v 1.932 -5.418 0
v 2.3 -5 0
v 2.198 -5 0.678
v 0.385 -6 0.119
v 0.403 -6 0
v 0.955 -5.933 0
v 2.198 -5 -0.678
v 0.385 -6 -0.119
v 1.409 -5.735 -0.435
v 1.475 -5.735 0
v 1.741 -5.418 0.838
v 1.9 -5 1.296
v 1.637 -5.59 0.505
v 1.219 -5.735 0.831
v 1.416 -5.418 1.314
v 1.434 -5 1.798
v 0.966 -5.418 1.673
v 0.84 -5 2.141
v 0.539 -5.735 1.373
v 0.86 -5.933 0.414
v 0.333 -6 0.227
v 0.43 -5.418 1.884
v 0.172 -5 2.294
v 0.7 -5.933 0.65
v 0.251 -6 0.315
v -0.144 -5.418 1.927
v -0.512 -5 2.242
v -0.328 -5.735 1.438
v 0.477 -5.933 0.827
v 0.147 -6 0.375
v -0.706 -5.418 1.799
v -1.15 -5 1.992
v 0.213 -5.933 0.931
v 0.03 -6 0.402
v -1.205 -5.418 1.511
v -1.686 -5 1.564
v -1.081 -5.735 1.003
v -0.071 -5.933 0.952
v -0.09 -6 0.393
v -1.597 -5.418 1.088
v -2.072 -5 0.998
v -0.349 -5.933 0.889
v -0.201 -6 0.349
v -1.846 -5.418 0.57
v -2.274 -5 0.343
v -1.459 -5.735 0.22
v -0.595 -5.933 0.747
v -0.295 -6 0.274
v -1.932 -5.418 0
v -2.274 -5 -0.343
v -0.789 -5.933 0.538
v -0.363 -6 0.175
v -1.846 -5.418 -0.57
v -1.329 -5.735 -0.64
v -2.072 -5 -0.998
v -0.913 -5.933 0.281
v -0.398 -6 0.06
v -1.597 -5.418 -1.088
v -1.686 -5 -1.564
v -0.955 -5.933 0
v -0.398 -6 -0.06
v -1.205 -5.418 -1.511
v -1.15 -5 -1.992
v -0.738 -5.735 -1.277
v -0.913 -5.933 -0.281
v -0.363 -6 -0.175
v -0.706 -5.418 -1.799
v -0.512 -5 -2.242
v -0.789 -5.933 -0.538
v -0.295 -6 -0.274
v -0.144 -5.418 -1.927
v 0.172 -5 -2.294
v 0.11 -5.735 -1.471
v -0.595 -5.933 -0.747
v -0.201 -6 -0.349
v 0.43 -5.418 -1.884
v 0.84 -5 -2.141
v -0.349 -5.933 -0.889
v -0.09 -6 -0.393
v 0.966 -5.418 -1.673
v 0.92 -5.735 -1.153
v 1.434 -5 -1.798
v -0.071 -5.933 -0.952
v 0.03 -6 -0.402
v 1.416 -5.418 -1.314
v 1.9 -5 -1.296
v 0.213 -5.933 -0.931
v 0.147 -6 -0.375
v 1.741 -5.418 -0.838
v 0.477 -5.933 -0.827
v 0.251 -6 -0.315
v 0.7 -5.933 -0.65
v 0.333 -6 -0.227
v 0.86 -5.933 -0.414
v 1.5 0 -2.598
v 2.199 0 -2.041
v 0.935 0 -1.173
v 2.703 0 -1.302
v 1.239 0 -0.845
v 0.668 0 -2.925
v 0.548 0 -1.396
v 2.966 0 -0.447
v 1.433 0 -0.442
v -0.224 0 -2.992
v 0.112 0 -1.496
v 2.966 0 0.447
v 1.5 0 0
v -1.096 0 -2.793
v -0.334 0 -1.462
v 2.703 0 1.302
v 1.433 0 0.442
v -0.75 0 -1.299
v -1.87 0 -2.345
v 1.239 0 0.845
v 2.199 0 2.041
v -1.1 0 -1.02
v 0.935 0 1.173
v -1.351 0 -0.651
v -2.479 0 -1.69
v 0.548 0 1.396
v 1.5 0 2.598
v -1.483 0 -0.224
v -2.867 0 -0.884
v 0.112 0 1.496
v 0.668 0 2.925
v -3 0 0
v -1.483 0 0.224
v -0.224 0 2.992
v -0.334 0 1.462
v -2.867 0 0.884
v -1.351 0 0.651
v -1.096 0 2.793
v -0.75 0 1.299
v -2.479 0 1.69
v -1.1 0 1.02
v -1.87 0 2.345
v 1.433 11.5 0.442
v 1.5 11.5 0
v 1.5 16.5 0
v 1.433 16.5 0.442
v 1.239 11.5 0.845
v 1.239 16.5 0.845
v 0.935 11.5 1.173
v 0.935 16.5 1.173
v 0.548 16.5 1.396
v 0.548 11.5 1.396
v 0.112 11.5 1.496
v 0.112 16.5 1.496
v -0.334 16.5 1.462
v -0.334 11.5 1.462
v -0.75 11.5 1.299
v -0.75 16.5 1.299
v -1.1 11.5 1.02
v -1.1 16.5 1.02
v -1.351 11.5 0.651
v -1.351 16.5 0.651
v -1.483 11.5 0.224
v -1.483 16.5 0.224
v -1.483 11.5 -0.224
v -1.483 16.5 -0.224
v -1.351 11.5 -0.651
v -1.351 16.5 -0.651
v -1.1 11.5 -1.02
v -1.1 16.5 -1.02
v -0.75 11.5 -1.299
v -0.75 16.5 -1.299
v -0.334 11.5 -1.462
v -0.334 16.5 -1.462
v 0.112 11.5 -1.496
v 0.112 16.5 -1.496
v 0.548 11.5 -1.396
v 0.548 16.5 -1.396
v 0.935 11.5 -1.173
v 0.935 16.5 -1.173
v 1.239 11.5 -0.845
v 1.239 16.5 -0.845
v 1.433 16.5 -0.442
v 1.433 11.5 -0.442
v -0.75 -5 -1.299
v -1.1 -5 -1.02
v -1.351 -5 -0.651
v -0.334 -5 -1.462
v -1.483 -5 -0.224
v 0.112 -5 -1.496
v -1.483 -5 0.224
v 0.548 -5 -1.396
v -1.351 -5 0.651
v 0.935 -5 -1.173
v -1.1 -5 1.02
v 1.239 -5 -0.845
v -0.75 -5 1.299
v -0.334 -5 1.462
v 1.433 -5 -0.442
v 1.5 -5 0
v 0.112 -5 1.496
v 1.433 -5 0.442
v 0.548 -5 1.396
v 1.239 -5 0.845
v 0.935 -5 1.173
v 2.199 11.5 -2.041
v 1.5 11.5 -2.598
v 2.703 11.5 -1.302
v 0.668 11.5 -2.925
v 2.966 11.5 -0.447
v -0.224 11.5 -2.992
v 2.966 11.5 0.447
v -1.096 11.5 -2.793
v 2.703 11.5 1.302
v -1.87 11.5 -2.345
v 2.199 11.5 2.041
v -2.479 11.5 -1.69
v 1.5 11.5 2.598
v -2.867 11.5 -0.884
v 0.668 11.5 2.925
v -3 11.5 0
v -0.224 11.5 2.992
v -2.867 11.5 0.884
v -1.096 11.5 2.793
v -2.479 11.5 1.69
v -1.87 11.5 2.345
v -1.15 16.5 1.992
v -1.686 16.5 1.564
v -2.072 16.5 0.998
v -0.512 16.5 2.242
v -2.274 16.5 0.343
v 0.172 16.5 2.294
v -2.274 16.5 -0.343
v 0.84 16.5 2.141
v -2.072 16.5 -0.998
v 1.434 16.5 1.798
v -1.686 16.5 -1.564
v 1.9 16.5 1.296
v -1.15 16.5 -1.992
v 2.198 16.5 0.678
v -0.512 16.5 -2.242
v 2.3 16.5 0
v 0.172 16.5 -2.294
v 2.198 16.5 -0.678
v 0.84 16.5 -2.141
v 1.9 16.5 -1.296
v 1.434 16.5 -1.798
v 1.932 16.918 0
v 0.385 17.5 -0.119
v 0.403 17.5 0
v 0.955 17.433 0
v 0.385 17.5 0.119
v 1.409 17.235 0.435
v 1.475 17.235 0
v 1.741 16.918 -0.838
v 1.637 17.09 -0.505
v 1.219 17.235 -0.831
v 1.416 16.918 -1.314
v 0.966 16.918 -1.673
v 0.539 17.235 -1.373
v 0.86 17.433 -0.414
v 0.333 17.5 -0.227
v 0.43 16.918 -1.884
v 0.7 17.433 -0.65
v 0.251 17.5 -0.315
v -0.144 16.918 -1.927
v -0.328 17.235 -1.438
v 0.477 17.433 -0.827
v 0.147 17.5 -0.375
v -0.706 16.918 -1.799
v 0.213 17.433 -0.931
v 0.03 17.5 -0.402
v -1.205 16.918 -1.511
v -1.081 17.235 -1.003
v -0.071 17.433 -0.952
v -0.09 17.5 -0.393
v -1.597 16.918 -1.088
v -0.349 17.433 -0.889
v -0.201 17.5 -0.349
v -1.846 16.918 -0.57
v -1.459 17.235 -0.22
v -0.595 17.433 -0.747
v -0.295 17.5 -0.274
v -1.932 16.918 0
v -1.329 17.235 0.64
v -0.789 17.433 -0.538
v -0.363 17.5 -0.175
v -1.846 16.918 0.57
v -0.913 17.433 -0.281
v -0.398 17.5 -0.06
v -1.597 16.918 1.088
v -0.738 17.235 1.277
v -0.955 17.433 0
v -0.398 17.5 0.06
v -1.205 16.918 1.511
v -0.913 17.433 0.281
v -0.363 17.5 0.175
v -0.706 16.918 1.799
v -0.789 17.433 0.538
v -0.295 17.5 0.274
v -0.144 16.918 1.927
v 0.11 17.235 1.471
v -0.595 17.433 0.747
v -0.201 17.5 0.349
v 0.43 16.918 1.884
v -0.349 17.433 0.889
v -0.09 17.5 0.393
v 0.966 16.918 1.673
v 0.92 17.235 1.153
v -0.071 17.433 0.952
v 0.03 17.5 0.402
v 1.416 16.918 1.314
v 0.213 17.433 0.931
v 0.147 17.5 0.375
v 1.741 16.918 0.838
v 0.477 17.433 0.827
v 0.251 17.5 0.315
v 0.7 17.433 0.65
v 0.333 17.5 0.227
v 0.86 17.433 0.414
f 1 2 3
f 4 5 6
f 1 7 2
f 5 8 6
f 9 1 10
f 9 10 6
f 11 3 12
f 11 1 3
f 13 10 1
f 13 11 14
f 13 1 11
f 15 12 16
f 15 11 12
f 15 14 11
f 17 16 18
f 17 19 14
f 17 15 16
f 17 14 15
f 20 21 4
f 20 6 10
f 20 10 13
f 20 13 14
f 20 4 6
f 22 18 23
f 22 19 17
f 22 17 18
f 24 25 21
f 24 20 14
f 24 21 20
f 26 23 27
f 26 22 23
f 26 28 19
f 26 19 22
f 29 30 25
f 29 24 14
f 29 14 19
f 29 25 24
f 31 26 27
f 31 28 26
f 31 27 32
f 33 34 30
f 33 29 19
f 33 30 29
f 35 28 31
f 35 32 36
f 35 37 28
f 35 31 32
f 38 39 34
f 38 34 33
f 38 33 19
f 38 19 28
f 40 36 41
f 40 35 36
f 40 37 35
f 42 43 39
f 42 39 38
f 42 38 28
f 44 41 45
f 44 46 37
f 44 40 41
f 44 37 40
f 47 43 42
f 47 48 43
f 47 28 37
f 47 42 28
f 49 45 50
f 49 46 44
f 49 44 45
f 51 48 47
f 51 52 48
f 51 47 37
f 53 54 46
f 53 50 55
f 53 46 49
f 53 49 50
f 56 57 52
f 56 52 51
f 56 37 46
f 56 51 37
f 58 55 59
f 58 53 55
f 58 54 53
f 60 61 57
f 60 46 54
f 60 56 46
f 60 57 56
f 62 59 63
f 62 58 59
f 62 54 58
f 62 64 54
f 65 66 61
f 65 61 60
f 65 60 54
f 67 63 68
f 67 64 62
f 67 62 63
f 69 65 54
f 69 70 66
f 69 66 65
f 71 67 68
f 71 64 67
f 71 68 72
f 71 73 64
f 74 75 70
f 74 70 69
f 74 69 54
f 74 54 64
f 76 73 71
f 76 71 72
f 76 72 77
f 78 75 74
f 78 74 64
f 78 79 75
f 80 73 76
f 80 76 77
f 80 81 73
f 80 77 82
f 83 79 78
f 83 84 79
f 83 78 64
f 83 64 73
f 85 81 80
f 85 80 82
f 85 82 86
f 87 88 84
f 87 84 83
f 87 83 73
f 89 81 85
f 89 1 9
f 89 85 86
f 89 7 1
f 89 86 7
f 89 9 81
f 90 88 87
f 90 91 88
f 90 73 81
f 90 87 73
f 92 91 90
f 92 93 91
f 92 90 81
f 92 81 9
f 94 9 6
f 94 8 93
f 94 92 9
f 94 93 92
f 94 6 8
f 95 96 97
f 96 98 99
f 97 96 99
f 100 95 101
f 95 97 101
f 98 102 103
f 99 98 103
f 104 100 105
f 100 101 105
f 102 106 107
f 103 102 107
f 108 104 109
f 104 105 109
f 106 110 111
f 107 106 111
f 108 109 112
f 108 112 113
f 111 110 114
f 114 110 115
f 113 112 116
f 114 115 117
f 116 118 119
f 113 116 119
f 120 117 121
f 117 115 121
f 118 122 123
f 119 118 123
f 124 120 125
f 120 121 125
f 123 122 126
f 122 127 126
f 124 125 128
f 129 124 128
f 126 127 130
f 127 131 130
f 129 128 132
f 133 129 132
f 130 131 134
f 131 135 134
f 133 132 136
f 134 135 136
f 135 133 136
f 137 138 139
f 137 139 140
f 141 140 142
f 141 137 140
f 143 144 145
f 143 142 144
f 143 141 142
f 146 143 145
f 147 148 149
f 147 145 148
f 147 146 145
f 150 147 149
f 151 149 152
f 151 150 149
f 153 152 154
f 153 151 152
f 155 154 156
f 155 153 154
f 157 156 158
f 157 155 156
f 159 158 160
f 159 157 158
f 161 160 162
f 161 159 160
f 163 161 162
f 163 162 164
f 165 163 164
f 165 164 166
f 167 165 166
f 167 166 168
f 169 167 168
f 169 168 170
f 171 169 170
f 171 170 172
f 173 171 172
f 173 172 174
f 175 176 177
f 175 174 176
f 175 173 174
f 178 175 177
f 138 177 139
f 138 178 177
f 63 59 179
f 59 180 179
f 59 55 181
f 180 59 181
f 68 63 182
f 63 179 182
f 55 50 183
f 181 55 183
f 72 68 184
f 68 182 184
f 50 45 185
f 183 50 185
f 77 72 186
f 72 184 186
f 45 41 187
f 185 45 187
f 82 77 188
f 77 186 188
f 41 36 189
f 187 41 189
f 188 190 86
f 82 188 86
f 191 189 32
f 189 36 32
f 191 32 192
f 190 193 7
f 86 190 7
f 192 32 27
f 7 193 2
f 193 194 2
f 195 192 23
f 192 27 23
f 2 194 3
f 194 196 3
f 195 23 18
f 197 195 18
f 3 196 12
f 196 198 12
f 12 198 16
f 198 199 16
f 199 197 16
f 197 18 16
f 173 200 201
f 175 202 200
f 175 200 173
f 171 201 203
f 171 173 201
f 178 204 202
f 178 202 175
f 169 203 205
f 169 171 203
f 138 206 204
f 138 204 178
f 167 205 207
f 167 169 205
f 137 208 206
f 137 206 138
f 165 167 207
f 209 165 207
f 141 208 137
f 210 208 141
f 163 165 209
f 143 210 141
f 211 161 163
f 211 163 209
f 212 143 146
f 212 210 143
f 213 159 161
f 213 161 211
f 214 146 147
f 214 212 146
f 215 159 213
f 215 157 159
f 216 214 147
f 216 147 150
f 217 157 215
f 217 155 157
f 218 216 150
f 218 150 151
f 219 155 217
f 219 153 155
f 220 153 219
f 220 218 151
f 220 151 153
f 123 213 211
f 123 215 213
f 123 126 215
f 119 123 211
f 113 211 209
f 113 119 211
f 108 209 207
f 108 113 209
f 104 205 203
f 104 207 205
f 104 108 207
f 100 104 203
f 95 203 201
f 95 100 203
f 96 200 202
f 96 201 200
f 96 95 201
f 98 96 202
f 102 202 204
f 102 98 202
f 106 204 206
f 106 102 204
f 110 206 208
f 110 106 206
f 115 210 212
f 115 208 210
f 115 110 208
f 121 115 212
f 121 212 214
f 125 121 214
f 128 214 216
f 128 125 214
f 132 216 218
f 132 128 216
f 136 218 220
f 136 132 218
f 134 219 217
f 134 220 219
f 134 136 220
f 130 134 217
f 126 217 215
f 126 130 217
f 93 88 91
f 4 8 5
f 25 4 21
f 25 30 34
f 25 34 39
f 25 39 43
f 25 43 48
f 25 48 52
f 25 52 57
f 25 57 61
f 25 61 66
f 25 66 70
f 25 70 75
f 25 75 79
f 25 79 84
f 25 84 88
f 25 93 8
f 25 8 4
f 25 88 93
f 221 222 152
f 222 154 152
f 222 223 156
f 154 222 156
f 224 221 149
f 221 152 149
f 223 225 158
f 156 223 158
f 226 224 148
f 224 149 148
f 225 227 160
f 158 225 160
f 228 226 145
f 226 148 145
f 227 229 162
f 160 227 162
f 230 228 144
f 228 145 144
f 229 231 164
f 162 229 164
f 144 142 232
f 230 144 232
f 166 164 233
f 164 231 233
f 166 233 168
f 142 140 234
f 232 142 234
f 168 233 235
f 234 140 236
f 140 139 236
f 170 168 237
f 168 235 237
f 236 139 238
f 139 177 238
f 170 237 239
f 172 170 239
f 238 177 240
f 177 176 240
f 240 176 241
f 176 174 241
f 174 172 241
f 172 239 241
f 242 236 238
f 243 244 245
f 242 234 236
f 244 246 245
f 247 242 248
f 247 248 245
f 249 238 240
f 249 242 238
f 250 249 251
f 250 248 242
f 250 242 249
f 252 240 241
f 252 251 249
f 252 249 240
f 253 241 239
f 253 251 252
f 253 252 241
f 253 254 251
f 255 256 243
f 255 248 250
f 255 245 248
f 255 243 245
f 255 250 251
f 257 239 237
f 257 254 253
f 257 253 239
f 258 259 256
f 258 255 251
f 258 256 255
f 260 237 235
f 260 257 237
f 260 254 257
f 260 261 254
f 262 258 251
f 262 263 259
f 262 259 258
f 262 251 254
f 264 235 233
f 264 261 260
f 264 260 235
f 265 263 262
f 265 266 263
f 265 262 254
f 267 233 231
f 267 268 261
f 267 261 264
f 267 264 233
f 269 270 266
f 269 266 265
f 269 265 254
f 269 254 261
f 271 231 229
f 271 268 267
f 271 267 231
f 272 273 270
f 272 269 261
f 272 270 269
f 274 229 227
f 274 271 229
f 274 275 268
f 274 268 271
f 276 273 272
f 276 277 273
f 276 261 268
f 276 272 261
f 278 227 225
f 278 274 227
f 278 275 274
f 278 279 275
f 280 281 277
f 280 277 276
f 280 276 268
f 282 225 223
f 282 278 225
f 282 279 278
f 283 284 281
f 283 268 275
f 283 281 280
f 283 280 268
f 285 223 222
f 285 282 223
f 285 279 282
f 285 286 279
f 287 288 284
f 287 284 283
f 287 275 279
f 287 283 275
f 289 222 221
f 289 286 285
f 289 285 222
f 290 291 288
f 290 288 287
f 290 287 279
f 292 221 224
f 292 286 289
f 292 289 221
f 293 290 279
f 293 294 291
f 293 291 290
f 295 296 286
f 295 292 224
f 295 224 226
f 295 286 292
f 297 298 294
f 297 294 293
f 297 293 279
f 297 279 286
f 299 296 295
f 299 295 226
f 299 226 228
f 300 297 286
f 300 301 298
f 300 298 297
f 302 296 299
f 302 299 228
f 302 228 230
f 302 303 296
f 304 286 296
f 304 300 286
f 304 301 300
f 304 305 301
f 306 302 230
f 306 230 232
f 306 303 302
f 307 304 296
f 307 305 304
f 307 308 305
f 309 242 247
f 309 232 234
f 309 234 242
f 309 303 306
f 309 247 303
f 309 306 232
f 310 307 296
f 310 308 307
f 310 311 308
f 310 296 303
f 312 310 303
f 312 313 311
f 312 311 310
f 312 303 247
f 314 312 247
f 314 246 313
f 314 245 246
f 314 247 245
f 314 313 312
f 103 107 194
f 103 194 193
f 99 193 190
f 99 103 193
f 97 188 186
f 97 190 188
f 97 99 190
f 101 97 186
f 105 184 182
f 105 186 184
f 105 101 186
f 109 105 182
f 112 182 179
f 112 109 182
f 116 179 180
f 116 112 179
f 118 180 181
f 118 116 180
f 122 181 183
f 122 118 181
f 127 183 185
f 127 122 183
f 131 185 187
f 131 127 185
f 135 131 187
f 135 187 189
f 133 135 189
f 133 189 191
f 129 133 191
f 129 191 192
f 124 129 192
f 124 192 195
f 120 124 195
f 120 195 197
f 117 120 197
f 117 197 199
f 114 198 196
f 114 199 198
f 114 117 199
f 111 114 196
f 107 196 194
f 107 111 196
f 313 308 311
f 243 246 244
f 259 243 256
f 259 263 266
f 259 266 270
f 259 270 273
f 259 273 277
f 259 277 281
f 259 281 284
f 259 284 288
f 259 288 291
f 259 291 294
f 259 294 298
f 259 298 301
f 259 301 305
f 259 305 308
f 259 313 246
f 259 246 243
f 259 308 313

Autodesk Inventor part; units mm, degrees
ref_plane "YZ Plane" through (0, 0, 0) normal (1, 0, 0) x (0, 1, 0)
ref_plane "XZ Plane" through (0, 0, 0) normal (0, 1, 0) x (-1, 0, 0)
ref_plane "XY Plane" through (0, 0, 0) normal (0, 0, 1) x (1, 0, 0)
sketch "Sketch2" plane through (0, 0, 0) normal (0, 1, 0) x (-1, 0, 0)
  circle A0 centre (0, 0) radius 3
  dimension "d3" = 6
extrude "Extrusion2" add sketch "Sketch2" along normal blind 11.5
sketch "Sketch3" plane through (0, 11.5, 0) normal (0, 1, 0) x (1, 0, 0)
  circle A0 centre (0, 0) radius 3 projected
  circle A1 centre (0, 0) radius 1.5
  dimension "d6" = 3
extrude "Extrusion3" add sketch "Sketch3" along normal blind 5 contours A1
sketch "Sketch7" plane through (0, 0, 0) normal (0, -1, 0) x (1, 0, 0)
  circle A0 centre (0, 0) radius 1.5
  dimension "d16" = 3
extrude "Extrusion4" add sketch "Sketch7" along normal blind 5
sketch "Sketch8" plane through (0, -5, 0) normal (0, -1, 0) x (1, 0, 0)
  circle A0 centre (0, 0) radius 2.3
  dimension "d23" = 4.6
extrude "Extrusion5" add sketch "Sketch8" along normal blind 1
sketch "Sketch9" plane through (0, 16.5, 0) normal (0, 1, 0) x (1, 0, 0)
  circle A0 centre (0, 0) radius 2.3
  dimension "d26" = 4.6
extrude "Extrusion6" add sketch "Sketch9" along normal blind 1
fillet "Fillet2" radius 2.3 1 edges at (-2.3, 17.5, 0)
fillet "Fillet3" radius 2.3 1 edges at (-2.3, -6, 0)
properties part number "reverse gear link rod"
